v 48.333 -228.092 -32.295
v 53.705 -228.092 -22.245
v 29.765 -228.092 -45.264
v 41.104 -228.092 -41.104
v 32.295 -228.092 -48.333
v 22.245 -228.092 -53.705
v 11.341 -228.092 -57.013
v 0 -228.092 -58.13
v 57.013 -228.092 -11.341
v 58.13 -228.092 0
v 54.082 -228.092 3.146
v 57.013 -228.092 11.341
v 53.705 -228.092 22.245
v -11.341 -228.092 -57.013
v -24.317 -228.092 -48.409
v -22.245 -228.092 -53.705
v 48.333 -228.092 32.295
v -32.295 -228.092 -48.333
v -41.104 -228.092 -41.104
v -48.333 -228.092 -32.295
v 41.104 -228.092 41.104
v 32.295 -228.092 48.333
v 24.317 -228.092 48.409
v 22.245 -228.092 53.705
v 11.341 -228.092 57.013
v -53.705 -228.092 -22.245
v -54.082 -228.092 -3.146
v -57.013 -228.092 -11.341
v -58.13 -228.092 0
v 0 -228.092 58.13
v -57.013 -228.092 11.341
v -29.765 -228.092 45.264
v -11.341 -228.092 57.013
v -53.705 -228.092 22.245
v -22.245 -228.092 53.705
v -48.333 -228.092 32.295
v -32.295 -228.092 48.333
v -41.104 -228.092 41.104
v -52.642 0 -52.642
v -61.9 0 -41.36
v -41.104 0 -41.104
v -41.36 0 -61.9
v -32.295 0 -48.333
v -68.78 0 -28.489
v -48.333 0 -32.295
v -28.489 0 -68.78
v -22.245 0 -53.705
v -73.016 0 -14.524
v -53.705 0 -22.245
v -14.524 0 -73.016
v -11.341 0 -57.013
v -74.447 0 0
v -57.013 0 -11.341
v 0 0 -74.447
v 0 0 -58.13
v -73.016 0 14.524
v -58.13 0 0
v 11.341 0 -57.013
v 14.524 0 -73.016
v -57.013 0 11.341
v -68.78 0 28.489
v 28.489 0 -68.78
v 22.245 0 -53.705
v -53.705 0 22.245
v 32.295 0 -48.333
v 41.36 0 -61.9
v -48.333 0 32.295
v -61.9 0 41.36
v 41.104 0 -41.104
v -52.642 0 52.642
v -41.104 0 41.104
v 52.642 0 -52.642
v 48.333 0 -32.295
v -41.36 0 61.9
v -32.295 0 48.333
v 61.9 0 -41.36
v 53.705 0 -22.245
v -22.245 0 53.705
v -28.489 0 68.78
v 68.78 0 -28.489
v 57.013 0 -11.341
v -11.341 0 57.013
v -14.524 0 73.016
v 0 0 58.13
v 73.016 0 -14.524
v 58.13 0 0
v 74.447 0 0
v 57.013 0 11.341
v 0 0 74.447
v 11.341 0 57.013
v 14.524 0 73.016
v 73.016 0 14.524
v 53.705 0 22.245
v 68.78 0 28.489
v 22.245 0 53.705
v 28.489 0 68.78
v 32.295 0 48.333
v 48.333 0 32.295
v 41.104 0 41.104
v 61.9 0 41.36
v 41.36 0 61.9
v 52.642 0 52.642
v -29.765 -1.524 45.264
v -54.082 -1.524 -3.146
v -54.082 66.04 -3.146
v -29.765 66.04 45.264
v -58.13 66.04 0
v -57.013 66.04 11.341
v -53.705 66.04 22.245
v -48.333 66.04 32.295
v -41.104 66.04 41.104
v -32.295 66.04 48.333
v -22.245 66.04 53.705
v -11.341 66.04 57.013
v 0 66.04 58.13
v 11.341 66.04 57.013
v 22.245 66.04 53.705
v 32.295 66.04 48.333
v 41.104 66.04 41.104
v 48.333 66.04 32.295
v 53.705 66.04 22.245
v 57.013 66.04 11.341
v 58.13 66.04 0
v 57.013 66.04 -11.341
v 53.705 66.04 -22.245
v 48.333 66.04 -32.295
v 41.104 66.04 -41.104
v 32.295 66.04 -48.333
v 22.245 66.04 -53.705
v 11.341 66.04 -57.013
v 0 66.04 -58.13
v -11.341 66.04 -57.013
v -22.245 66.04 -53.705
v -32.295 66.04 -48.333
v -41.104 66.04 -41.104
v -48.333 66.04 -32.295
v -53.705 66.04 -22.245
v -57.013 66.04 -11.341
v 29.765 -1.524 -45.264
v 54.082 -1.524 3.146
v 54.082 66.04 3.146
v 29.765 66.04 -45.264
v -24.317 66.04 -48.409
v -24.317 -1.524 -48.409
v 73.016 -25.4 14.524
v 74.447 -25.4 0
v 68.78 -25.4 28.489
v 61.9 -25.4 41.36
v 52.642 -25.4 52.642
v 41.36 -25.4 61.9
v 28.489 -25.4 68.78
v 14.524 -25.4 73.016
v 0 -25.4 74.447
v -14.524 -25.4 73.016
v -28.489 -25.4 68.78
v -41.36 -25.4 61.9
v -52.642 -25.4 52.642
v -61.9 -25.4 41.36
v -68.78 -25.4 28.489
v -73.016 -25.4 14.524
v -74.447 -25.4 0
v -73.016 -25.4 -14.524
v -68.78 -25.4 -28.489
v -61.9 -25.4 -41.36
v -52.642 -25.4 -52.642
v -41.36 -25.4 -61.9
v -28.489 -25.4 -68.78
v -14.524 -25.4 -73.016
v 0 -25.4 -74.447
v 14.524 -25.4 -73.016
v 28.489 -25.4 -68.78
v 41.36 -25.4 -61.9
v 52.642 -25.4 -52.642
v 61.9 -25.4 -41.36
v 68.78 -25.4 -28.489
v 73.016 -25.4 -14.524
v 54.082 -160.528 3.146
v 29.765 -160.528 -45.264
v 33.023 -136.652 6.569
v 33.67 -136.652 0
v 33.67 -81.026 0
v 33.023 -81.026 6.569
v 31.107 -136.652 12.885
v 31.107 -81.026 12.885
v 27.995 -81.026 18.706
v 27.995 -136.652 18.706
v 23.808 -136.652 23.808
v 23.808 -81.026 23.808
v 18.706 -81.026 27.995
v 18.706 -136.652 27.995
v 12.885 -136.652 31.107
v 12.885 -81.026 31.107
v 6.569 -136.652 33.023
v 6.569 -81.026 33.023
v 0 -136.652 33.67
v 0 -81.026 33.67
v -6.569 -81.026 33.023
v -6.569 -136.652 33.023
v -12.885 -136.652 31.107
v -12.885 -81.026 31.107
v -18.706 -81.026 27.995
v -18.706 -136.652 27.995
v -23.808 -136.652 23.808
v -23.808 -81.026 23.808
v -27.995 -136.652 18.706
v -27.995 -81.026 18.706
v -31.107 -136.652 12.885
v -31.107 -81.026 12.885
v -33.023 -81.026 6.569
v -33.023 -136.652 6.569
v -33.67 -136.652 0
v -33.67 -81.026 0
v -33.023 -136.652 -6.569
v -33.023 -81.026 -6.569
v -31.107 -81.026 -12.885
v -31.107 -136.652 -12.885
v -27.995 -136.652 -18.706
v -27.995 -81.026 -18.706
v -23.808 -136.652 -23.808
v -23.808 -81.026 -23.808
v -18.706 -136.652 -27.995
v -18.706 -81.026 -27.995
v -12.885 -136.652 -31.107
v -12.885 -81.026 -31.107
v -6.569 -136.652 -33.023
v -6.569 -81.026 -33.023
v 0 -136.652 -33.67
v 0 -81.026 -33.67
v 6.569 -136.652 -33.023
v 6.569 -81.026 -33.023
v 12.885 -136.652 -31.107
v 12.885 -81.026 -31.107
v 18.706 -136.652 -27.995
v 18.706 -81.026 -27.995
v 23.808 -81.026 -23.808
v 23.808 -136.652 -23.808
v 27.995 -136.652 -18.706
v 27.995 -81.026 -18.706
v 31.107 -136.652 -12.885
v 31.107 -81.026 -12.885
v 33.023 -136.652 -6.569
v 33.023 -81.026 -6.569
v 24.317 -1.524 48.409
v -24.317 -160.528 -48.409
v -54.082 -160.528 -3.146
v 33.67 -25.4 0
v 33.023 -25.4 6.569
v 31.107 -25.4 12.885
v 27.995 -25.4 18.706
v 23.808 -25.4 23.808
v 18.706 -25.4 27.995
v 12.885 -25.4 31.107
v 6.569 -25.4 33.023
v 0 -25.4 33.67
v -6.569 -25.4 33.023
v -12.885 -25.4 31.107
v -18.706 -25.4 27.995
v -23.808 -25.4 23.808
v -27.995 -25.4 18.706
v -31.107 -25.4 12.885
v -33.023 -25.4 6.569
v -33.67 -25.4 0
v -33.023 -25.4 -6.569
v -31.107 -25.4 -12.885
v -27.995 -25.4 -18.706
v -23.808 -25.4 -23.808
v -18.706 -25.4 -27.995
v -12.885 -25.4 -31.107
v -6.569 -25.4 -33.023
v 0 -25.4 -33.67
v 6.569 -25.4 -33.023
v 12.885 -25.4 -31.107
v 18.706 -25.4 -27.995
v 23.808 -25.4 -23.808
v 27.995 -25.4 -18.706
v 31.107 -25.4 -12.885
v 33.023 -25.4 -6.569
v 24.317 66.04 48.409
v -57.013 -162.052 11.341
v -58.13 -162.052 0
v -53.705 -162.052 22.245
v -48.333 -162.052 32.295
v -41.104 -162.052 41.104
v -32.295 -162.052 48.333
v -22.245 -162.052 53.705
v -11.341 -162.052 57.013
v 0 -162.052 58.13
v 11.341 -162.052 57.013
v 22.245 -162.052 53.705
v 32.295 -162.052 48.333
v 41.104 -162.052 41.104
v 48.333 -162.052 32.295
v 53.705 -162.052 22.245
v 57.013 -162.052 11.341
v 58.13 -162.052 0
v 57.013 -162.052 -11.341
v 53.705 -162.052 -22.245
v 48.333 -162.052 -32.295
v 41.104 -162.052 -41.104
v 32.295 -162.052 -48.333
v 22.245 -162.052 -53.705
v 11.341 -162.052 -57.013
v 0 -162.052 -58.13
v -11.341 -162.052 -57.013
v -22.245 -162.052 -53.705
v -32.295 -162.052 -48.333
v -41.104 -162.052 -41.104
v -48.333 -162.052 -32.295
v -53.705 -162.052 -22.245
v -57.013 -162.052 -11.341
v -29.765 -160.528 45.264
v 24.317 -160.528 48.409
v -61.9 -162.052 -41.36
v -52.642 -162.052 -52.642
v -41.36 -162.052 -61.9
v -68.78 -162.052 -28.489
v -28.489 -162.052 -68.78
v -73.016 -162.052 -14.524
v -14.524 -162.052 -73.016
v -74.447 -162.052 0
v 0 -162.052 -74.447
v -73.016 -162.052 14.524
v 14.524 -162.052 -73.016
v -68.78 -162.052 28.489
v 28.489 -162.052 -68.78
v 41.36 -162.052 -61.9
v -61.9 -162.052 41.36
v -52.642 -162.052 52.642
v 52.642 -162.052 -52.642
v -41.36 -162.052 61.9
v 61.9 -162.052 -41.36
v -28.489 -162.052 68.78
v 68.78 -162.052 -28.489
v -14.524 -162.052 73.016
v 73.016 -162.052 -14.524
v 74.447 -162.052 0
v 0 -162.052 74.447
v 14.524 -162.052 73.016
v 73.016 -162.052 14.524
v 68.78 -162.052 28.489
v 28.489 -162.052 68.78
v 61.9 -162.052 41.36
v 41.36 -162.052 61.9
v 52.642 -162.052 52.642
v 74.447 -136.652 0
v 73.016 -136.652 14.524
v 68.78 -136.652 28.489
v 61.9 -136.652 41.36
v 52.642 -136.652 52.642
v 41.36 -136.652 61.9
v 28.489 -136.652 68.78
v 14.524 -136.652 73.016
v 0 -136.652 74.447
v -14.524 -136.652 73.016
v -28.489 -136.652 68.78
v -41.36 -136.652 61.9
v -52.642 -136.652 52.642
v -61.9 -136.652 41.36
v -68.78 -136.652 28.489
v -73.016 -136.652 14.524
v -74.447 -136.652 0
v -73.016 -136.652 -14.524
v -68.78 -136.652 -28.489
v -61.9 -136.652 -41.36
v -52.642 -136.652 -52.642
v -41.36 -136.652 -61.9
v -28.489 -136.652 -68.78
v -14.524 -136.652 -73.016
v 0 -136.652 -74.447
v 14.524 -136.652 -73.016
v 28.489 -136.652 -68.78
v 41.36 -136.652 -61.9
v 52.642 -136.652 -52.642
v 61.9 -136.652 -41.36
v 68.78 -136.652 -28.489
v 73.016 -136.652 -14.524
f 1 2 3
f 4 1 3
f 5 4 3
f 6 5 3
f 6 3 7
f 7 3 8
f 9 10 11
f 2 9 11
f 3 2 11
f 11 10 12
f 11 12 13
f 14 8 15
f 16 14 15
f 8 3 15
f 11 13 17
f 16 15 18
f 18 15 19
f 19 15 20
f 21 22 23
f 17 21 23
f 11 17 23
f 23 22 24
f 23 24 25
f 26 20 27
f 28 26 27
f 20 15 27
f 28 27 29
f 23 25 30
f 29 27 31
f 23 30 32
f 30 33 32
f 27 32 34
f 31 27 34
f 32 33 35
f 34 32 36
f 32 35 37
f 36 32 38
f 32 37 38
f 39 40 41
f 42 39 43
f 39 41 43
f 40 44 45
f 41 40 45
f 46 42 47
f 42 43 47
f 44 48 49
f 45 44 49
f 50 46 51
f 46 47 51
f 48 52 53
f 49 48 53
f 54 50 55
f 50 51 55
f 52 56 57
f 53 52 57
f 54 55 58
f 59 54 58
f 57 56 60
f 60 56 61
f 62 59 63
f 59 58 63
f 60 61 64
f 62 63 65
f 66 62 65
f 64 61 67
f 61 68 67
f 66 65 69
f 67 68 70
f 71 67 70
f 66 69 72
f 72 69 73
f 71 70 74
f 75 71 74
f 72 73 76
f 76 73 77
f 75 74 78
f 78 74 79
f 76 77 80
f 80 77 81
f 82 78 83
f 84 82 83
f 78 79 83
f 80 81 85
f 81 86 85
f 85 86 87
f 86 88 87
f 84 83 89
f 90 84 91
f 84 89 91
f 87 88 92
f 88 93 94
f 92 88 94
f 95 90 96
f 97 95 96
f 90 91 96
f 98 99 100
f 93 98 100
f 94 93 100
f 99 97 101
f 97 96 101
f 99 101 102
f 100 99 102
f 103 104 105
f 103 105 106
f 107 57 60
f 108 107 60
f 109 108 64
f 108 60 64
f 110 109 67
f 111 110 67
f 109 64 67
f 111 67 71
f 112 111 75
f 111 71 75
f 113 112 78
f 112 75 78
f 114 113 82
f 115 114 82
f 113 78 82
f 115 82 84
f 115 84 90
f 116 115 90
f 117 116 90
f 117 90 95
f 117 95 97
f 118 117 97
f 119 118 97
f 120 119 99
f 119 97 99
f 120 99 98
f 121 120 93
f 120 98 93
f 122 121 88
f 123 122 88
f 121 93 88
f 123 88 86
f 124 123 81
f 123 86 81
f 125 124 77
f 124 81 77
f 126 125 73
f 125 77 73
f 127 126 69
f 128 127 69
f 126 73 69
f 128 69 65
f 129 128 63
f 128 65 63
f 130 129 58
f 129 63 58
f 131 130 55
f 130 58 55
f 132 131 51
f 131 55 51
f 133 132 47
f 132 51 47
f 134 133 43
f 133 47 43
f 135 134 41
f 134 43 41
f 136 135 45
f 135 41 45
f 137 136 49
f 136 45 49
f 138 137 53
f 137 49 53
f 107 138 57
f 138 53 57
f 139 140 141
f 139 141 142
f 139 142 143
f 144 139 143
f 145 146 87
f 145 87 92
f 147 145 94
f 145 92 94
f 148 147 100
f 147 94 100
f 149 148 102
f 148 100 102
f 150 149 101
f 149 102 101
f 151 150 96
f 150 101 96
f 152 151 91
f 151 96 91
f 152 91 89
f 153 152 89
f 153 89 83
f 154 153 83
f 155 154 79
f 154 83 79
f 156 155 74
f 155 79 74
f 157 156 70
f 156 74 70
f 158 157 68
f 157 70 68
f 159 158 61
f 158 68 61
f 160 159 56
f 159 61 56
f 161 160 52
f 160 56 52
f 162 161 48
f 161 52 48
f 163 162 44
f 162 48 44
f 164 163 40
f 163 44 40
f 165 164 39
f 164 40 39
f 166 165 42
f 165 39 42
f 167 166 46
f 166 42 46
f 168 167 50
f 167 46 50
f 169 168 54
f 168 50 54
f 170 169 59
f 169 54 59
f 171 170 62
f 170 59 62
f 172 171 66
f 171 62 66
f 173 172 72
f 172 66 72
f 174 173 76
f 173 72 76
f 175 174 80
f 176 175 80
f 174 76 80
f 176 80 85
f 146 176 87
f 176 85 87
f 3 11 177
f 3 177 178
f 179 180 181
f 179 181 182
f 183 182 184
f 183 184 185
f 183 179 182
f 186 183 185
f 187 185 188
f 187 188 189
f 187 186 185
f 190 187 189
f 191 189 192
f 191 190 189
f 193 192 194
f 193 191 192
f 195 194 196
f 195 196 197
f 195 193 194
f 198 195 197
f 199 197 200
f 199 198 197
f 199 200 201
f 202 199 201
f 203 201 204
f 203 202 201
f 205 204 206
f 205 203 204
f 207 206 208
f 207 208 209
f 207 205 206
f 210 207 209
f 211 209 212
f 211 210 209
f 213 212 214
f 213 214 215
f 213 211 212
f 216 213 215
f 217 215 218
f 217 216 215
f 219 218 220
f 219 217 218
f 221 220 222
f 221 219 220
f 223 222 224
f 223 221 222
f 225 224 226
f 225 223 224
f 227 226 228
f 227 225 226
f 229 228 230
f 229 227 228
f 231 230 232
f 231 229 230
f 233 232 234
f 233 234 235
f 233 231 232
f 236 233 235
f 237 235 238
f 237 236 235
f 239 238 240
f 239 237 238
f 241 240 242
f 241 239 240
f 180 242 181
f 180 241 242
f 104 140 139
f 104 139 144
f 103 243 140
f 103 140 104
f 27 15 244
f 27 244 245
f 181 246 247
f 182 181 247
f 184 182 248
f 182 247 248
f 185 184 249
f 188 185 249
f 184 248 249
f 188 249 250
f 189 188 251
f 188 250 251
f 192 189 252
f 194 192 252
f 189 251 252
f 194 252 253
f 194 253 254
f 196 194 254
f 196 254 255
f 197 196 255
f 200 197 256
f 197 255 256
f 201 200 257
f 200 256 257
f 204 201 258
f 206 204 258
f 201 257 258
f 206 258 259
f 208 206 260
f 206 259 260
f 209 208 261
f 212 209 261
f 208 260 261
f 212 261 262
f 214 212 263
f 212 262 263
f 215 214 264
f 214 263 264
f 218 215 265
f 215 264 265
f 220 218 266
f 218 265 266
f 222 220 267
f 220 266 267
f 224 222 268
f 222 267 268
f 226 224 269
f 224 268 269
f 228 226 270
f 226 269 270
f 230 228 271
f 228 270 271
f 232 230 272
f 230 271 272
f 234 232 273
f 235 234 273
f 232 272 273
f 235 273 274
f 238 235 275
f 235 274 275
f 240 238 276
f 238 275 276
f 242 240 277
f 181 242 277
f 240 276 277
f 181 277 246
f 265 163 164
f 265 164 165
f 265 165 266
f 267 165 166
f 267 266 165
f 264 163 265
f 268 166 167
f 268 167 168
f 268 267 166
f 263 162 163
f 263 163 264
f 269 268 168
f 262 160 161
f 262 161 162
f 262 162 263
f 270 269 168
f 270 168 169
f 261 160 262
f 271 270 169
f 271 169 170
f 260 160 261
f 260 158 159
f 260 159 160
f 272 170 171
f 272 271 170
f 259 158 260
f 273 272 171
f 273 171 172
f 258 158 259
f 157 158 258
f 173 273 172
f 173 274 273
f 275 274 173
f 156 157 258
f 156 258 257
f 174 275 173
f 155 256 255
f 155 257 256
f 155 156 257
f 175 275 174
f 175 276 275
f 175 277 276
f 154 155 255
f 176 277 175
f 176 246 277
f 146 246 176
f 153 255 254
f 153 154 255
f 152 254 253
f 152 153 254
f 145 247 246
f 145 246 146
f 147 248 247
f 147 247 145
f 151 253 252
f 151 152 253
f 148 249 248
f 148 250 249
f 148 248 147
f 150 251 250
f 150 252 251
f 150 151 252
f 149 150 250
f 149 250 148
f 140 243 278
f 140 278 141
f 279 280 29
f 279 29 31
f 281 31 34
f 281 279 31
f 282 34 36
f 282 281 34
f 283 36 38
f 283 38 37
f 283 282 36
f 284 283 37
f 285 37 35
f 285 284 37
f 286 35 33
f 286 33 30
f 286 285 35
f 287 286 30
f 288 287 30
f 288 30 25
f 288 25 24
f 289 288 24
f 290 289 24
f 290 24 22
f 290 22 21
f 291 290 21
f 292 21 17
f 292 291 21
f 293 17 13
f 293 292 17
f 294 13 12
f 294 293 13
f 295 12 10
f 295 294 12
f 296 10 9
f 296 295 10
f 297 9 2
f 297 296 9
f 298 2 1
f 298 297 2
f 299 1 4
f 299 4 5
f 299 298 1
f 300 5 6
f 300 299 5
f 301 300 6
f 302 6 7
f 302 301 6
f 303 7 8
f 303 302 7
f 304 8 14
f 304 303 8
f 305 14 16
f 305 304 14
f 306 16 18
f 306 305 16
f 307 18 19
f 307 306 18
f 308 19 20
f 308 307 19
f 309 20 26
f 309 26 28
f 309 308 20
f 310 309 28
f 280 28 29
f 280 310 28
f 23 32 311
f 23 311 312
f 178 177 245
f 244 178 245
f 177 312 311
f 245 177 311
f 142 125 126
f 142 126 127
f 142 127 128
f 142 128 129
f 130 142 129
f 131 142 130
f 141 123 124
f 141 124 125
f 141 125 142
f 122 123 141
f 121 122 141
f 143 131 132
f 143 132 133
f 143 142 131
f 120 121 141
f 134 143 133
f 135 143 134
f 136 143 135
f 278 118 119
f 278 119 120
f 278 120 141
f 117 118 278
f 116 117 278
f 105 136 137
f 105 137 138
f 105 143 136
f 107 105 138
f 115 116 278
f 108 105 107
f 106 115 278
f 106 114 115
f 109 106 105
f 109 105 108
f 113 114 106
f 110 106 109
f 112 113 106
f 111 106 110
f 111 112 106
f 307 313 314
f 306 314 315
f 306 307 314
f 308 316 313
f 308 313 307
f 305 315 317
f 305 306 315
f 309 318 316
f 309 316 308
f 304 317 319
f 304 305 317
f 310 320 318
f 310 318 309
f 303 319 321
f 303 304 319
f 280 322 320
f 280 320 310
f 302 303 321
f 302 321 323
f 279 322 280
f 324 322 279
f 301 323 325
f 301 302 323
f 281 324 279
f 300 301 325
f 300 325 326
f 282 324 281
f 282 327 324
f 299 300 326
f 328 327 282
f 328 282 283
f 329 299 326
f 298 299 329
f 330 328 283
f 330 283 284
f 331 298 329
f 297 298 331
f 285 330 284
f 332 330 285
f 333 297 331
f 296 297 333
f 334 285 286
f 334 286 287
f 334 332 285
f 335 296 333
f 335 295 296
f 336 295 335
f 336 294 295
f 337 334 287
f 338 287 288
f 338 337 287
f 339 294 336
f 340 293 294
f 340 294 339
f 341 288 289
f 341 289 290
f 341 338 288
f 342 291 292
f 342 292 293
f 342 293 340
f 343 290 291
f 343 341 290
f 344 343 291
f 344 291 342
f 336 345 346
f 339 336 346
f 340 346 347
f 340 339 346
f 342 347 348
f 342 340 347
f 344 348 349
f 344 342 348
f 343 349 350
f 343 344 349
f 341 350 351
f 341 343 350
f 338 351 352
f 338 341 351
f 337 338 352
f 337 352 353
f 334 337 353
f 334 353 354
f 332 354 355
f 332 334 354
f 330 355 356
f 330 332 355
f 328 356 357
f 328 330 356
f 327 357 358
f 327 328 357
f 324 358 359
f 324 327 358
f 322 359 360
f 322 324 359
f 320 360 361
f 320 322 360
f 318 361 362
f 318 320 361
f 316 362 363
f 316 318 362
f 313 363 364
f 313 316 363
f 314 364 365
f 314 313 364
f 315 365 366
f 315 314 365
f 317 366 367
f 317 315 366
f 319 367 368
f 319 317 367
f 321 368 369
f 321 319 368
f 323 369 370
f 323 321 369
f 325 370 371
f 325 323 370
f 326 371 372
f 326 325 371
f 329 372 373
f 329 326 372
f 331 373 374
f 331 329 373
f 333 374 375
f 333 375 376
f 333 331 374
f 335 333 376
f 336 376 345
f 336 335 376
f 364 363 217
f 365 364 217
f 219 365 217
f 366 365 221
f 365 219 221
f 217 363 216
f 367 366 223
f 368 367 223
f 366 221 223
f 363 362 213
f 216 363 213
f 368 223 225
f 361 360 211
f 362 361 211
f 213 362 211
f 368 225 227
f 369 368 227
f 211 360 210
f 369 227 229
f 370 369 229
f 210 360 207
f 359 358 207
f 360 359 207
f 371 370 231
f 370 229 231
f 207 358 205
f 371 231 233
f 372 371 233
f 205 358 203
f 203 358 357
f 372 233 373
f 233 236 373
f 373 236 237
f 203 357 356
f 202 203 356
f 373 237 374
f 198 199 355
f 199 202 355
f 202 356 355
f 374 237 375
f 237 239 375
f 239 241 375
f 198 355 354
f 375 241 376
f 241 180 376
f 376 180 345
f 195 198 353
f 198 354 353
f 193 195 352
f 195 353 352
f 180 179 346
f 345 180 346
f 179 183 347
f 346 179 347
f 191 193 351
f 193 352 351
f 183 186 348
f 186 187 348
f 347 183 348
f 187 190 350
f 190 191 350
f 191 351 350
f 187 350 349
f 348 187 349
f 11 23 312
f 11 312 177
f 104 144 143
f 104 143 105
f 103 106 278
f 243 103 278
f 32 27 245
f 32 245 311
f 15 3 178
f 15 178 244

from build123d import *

# Parameters (mm, degrees)
F0_R     = 74.446601
F1_DEPTH = 25.4
F2_R     = 58.130128
F3_DEPTH = 66.04
F5_DEPTH = 67.564
F6_R     = 33.669878
F7_DEPTH = 55.626


with BuildPart() as f1:
    # F0 (on Front) → F1 (new body)
    with BuildSketch(Plane.XZ):
        Circle(F0_R)
    extrude(amount=F1_DEPTH)

    # F2 (on face) → F3 (join)
    with BuildSketch(Plane(origin=(0, 0, 0), x_dir=(-1, 0, 0), z_dir=(0, 1, 0))):
        Circle(F2_R)
    extrude(amount=F3_DEPTH)

    # F4 (on face) → F5 (cut)
    with BuildSketch(Plane(origin=(0, 66.04, 0), x_dir=(-1, 0, 0), z_dir=(0, 1, 0))):
        Polygon((24.31692, -48.409281), (54.082127, -3.14557), (29.765207, 45.263711), (-24.31692, 48.409281), (-54.082127, 3.14557), (-29.765207, -45.263711), align=None)
    extrude(amount=-F5_DEPTH, mode=Mode.SUBTRACT)

    # F6 (on face) → F7 (join)
    with BuildSketch(Plane.XZ.offset(25.4)):
        Circle(F6_R)
    extrude(amount=F7_DEPTH)

    # F8: F1 across face


with BuildPart() as f1_1:
    add(f1.part)
    add(f1.part.mirror(Plane.XZ.offset(81.026)))


solid = f1_1.part
